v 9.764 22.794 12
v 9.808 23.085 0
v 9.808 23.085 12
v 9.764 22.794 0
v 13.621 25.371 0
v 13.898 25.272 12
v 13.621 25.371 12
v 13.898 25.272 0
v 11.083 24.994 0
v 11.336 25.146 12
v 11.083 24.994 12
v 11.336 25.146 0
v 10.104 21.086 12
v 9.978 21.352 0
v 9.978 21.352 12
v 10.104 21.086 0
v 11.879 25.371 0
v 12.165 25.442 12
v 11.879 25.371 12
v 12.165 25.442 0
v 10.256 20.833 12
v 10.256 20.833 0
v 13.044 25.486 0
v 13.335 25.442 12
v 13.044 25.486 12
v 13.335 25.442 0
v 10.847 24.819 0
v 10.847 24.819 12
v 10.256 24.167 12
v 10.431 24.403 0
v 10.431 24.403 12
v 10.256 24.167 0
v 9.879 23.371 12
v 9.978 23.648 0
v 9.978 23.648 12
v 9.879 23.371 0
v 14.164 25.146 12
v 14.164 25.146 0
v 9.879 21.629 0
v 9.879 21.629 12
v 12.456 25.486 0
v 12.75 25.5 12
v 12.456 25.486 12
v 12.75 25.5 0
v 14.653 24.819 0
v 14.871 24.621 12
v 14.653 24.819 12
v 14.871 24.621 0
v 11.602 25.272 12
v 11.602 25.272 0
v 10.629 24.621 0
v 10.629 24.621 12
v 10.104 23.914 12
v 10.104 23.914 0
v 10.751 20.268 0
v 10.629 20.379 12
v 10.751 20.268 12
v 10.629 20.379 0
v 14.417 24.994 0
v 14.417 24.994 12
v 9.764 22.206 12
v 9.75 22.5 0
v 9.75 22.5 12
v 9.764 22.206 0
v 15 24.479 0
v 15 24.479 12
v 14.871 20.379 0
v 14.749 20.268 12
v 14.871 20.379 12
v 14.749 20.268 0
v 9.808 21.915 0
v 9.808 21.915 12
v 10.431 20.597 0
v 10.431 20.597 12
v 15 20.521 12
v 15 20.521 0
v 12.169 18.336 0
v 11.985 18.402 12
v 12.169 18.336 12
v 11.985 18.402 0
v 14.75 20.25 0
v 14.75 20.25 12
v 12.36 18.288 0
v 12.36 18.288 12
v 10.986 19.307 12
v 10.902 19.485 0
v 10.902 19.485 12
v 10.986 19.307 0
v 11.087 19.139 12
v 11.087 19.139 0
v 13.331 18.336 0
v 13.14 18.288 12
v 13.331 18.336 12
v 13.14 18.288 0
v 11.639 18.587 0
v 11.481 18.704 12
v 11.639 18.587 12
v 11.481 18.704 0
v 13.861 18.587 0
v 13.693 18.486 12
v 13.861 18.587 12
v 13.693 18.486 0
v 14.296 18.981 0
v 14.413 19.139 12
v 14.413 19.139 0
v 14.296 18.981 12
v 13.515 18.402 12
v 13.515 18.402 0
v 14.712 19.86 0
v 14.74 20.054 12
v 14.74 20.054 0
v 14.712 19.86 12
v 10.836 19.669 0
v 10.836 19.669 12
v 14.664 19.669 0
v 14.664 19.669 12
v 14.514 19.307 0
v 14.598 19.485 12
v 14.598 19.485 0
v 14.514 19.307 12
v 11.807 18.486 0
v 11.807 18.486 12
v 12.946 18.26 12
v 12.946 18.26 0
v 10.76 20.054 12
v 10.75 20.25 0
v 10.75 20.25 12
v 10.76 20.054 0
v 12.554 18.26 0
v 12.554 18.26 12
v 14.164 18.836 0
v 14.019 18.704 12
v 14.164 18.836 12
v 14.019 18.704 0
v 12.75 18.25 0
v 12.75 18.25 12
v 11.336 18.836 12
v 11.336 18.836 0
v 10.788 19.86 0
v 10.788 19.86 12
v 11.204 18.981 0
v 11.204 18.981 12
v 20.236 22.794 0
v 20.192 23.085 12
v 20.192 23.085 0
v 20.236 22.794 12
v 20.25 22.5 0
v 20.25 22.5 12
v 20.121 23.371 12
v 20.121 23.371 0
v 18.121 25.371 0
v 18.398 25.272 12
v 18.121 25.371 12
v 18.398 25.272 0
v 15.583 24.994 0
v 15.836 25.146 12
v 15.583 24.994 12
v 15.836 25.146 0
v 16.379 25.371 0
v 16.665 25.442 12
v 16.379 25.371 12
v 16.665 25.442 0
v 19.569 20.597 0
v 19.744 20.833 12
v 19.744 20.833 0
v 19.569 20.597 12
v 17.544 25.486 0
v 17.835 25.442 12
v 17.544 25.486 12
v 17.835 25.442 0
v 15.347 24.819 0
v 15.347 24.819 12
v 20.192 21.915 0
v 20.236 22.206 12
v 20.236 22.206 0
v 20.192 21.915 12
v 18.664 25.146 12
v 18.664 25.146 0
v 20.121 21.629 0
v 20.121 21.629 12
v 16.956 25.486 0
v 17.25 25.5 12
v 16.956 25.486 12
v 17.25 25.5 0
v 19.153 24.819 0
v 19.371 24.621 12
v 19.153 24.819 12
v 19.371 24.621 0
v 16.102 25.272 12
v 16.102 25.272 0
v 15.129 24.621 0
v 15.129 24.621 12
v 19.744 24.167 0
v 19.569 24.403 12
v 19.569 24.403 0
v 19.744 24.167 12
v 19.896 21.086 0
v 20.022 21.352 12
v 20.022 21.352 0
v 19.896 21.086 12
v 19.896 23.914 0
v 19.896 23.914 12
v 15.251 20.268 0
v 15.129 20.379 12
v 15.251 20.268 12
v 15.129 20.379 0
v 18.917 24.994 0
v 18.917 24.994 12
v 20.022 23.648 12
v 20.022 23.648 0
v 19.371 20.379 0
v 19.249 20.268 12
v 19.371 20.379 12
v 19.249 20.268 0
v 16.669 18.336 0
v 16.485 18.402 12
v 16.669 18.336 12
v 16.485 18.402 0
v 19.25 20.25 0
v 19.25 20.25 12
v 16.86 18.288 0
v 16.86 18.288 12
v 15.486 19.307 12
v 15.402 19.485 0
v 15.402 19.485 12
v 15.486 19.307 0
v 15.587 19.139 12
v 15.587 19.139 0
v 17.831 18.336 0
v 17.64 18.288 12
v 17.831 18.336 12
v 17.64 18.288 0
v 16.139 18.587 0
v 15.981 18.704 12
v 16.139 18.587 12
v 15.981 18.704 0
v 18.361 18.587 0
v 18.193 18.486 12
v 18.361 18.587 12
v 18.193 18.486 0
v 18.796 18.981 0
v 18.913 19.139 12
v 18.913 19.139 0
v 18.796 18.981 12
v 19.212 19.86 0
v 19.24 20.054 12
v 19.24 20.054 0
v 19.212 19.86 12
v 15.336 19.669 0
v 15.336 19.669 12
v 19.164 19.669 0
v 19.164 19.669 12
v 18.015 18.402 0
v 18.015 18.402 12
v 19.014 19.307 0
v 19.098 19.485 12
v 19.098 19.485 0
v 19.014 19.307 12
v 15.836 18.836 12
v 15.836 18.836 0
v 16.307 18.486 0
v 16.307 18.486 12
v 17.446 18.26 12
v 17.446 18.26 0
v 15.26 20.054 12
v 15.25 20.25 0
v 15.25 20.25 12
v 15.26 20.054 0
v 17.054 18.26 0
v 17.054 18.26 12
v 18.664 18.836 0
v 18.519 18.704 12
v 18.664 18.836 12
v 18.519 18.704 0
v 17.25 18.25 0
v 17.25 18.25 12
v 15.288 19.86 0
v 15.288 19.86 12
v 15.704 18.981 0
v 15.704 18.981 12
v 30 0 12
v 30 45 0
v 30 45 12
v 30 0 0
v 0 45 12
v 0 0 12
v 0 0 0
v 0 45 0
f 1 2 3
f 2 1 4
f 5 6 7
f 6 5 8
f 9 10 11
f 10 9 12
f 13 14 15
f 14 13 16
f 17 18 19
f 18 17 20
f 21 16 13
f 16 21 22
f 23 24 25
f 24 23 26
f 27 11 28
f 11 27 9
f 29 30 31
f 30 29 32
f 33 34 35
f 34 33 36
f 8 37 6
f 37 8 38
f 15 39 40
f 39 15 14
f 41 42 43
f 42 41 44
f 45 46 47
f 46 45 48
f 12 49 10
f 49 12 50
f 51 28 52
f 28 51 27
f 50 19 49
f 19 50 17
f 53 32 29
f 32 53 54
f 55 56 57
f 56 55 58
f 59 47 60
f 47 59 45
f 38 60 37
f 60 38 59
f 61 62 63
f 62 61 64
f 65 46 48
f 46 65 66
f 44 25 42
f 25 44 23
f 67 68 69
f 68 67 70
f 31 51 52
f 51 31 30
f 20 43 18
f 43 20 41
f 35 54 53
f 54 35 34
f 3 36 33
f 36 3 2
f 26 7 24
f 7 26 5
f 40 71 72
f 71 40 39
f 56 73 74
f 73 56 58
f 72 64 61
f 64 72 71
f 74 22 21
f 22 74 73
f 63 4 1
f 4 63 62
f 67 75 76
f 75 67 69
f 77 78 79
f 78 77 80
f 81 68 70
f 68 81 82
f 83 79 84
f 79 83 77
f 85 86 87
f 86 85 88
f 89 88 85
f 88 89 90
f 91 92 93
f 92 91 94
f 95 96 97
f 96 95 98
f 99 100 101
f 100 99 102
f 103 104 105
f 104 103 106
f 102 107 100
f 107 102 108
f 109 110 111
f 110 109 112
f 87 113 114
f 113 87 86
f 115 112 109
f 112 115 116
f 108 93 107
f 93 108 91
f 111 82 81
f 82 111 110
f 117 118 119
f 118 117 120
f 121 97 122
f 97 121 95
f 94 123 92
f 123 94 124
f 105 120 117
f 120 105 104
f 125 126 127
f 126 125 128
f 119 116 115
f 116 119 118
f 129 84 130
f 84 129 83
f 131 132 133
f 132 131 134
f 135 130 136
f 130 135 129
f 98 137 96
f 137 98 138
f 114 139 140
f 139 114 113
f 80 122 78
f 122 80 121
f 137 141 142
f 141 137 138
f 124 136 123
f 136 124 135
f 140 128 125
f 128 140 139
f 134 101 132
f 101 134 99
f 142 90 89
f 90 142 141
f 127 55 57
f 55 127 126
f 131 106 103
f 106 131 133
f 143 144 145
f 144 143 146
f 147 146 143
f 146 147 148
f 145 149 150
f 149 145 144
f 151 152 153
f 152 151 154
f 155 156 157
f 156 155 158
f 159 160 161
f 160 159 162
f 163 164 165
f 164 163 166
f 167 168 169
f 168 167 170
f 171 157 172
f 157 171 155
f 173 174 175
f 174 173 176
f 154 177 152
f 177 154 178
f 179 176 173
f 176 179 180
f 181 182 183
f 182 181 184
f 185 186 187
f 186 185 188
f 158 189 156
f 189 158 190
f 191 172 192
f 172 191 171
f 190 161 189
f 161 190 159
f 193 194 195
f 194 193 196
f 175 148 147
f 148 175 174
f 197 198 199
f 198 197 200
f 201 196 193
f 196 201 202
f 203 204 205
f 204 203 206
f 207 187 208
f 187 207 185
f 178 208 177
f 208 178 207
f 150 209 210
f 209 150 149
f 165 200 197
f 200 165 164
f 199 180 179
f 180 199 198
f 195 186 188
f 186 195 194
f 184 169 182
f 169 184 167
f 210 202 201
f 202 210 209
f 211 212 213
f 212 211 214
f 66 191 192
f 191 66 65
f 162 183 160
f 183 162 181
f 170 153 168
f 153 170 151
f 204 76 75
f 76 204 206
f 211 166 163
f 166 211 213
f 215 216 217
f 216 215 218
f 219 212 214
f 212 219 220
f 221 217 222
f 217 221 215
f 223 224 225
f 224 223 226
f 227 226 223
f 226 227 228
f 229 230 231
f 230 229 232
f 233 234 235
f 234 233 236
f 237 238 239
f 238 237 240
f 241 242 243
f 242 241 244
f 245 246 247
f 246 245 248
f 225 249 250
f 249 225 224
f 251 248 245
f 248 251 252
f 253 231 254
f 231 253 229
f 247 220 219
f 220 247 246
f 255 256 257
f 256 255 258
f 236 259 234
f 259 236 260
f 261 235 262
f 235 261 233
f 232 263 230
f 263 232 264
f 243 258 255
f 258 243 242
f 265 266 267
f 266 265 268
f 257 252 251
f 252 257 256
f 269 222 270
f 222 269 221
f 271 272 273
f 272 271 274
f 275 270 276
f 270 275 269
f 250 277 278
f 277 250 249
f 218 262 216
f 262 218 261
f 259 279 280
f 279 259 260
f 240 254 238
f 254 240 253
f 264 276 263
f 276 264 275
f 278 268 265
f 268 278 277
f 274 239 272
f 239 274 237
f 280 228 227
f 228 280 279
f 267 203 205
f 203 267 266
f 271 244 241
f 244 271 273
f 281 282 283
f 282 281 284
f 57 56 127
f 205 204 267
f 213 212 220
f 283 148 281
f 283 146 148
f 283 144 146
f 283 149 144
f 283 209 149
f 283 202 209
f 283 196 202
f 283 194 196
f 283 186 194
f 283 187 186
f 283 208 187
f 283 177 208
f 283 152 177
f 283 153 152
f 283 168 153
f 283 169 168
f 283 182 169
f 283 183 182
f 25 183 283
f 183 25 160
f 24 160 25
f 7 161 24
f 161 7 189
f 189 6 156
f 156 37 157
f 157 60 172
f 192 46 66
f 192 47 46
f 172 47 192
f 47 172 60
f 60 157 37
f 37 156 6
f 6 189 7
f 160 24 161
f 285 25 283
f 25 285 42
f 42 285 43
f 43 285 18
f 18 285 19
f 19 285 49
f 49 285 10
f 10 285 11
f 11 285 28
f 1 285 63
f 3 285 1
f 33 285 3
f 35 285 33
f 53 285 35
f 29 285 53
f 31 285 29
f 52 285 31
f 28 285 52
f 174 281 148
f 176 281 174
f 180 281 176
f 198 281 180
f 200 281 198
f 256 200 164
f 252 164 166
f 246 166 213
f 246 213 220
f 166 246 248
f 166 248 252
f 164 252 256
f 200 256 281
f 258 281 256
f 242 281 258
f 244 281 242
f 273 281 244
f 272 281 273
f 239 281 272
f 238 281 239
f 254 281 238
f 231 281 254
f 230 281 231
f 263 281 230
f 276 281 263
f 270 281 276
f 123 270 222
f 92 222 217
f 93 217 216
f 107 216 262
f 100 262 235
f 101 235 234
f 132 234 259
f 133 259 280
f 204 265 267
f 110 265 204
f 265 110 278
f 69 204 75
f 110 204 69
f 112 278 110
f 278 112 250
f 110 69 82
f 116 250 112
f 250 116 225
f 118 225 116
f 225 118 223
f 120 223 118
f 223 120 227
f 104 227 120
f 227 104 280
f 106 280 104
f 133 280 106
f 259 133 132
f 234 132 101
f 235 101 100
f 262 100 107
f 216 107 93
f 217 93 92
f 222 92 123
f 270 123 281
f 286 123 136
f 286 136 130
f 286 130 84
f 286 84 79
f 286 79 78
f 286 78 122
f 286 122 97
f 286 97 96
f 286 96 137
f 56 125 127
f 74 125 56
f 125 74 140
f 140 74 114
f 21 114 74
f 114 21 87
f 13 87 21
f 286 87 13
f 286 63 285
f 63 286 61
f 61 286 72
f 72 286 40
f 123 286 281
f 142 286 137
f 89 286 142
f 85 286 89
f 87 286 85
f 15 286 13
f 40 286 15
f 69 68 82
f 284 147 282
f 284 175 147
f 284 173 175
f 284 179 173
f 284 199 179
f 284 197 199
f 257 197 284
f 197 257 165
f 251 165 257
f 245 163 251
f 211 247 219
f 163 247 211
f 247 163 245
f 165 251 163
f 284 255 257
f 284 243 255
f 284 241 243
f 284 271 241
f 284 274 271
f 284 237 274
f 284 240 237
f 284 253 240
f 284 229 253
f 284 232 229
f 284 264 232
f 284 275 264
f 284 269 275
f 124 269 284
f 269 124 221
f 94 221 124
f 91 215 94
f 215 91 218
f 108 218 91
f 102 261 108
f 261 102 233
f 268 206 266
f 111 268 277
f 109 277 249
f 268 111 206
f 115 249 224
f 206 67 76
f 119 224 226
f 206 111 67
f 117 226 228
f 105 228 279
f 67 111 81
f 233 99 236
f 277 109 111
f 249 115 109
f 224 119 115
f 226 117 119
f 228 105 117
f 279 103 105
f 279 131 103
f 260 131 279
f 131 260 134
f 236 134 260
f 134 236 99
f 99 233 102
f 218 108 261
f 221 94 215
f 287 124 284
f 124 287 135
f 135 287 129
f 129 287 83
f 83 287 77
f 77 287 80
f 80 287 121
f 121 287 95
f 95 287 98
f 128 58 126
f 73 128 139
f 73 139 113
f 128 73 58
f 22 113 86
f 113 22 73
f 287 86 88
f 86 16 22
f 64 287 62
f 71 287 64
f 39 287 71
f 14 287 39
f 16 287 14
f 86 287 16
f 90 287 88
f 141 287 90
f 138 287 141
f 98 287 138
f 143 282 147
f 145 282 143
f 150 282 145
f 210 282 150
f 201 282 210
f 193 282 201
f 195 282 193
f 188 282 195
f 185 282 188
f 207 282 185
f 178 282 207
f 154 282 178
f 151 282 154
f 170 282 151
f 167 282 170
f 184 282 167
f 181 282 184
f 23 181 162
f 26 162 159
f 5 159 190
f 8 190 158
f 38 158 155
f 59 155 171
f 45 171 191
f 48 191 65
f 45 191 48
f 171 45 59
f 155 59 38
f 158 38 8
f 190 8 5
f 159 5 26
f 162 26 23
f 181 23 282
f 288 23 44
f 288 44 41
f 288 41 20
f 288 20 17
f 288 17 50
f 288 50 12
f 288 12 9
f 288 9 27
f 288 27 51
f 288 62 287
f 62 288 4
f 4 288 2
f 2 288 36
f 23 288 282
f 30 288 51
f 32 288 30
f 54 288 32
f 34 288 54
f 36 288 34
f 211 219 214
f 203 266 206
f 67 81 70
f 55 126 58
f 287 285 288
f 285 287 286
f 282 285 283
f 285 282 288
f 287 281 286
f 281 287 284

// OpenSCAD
$fn = 64;

module centered_hole(x, y, d) {
    translate([x, y, -1]) cylinder(h=14, d=d);
}

difference() {
    cube([30, 45, 12], center=false);

    // Center of the box
    for (i = [-2.25, 2.25]) {
        centered_hole(15 + i, 22.5, 6);
        centered_hole(15 + i, 20.25, 4);
    }
}
